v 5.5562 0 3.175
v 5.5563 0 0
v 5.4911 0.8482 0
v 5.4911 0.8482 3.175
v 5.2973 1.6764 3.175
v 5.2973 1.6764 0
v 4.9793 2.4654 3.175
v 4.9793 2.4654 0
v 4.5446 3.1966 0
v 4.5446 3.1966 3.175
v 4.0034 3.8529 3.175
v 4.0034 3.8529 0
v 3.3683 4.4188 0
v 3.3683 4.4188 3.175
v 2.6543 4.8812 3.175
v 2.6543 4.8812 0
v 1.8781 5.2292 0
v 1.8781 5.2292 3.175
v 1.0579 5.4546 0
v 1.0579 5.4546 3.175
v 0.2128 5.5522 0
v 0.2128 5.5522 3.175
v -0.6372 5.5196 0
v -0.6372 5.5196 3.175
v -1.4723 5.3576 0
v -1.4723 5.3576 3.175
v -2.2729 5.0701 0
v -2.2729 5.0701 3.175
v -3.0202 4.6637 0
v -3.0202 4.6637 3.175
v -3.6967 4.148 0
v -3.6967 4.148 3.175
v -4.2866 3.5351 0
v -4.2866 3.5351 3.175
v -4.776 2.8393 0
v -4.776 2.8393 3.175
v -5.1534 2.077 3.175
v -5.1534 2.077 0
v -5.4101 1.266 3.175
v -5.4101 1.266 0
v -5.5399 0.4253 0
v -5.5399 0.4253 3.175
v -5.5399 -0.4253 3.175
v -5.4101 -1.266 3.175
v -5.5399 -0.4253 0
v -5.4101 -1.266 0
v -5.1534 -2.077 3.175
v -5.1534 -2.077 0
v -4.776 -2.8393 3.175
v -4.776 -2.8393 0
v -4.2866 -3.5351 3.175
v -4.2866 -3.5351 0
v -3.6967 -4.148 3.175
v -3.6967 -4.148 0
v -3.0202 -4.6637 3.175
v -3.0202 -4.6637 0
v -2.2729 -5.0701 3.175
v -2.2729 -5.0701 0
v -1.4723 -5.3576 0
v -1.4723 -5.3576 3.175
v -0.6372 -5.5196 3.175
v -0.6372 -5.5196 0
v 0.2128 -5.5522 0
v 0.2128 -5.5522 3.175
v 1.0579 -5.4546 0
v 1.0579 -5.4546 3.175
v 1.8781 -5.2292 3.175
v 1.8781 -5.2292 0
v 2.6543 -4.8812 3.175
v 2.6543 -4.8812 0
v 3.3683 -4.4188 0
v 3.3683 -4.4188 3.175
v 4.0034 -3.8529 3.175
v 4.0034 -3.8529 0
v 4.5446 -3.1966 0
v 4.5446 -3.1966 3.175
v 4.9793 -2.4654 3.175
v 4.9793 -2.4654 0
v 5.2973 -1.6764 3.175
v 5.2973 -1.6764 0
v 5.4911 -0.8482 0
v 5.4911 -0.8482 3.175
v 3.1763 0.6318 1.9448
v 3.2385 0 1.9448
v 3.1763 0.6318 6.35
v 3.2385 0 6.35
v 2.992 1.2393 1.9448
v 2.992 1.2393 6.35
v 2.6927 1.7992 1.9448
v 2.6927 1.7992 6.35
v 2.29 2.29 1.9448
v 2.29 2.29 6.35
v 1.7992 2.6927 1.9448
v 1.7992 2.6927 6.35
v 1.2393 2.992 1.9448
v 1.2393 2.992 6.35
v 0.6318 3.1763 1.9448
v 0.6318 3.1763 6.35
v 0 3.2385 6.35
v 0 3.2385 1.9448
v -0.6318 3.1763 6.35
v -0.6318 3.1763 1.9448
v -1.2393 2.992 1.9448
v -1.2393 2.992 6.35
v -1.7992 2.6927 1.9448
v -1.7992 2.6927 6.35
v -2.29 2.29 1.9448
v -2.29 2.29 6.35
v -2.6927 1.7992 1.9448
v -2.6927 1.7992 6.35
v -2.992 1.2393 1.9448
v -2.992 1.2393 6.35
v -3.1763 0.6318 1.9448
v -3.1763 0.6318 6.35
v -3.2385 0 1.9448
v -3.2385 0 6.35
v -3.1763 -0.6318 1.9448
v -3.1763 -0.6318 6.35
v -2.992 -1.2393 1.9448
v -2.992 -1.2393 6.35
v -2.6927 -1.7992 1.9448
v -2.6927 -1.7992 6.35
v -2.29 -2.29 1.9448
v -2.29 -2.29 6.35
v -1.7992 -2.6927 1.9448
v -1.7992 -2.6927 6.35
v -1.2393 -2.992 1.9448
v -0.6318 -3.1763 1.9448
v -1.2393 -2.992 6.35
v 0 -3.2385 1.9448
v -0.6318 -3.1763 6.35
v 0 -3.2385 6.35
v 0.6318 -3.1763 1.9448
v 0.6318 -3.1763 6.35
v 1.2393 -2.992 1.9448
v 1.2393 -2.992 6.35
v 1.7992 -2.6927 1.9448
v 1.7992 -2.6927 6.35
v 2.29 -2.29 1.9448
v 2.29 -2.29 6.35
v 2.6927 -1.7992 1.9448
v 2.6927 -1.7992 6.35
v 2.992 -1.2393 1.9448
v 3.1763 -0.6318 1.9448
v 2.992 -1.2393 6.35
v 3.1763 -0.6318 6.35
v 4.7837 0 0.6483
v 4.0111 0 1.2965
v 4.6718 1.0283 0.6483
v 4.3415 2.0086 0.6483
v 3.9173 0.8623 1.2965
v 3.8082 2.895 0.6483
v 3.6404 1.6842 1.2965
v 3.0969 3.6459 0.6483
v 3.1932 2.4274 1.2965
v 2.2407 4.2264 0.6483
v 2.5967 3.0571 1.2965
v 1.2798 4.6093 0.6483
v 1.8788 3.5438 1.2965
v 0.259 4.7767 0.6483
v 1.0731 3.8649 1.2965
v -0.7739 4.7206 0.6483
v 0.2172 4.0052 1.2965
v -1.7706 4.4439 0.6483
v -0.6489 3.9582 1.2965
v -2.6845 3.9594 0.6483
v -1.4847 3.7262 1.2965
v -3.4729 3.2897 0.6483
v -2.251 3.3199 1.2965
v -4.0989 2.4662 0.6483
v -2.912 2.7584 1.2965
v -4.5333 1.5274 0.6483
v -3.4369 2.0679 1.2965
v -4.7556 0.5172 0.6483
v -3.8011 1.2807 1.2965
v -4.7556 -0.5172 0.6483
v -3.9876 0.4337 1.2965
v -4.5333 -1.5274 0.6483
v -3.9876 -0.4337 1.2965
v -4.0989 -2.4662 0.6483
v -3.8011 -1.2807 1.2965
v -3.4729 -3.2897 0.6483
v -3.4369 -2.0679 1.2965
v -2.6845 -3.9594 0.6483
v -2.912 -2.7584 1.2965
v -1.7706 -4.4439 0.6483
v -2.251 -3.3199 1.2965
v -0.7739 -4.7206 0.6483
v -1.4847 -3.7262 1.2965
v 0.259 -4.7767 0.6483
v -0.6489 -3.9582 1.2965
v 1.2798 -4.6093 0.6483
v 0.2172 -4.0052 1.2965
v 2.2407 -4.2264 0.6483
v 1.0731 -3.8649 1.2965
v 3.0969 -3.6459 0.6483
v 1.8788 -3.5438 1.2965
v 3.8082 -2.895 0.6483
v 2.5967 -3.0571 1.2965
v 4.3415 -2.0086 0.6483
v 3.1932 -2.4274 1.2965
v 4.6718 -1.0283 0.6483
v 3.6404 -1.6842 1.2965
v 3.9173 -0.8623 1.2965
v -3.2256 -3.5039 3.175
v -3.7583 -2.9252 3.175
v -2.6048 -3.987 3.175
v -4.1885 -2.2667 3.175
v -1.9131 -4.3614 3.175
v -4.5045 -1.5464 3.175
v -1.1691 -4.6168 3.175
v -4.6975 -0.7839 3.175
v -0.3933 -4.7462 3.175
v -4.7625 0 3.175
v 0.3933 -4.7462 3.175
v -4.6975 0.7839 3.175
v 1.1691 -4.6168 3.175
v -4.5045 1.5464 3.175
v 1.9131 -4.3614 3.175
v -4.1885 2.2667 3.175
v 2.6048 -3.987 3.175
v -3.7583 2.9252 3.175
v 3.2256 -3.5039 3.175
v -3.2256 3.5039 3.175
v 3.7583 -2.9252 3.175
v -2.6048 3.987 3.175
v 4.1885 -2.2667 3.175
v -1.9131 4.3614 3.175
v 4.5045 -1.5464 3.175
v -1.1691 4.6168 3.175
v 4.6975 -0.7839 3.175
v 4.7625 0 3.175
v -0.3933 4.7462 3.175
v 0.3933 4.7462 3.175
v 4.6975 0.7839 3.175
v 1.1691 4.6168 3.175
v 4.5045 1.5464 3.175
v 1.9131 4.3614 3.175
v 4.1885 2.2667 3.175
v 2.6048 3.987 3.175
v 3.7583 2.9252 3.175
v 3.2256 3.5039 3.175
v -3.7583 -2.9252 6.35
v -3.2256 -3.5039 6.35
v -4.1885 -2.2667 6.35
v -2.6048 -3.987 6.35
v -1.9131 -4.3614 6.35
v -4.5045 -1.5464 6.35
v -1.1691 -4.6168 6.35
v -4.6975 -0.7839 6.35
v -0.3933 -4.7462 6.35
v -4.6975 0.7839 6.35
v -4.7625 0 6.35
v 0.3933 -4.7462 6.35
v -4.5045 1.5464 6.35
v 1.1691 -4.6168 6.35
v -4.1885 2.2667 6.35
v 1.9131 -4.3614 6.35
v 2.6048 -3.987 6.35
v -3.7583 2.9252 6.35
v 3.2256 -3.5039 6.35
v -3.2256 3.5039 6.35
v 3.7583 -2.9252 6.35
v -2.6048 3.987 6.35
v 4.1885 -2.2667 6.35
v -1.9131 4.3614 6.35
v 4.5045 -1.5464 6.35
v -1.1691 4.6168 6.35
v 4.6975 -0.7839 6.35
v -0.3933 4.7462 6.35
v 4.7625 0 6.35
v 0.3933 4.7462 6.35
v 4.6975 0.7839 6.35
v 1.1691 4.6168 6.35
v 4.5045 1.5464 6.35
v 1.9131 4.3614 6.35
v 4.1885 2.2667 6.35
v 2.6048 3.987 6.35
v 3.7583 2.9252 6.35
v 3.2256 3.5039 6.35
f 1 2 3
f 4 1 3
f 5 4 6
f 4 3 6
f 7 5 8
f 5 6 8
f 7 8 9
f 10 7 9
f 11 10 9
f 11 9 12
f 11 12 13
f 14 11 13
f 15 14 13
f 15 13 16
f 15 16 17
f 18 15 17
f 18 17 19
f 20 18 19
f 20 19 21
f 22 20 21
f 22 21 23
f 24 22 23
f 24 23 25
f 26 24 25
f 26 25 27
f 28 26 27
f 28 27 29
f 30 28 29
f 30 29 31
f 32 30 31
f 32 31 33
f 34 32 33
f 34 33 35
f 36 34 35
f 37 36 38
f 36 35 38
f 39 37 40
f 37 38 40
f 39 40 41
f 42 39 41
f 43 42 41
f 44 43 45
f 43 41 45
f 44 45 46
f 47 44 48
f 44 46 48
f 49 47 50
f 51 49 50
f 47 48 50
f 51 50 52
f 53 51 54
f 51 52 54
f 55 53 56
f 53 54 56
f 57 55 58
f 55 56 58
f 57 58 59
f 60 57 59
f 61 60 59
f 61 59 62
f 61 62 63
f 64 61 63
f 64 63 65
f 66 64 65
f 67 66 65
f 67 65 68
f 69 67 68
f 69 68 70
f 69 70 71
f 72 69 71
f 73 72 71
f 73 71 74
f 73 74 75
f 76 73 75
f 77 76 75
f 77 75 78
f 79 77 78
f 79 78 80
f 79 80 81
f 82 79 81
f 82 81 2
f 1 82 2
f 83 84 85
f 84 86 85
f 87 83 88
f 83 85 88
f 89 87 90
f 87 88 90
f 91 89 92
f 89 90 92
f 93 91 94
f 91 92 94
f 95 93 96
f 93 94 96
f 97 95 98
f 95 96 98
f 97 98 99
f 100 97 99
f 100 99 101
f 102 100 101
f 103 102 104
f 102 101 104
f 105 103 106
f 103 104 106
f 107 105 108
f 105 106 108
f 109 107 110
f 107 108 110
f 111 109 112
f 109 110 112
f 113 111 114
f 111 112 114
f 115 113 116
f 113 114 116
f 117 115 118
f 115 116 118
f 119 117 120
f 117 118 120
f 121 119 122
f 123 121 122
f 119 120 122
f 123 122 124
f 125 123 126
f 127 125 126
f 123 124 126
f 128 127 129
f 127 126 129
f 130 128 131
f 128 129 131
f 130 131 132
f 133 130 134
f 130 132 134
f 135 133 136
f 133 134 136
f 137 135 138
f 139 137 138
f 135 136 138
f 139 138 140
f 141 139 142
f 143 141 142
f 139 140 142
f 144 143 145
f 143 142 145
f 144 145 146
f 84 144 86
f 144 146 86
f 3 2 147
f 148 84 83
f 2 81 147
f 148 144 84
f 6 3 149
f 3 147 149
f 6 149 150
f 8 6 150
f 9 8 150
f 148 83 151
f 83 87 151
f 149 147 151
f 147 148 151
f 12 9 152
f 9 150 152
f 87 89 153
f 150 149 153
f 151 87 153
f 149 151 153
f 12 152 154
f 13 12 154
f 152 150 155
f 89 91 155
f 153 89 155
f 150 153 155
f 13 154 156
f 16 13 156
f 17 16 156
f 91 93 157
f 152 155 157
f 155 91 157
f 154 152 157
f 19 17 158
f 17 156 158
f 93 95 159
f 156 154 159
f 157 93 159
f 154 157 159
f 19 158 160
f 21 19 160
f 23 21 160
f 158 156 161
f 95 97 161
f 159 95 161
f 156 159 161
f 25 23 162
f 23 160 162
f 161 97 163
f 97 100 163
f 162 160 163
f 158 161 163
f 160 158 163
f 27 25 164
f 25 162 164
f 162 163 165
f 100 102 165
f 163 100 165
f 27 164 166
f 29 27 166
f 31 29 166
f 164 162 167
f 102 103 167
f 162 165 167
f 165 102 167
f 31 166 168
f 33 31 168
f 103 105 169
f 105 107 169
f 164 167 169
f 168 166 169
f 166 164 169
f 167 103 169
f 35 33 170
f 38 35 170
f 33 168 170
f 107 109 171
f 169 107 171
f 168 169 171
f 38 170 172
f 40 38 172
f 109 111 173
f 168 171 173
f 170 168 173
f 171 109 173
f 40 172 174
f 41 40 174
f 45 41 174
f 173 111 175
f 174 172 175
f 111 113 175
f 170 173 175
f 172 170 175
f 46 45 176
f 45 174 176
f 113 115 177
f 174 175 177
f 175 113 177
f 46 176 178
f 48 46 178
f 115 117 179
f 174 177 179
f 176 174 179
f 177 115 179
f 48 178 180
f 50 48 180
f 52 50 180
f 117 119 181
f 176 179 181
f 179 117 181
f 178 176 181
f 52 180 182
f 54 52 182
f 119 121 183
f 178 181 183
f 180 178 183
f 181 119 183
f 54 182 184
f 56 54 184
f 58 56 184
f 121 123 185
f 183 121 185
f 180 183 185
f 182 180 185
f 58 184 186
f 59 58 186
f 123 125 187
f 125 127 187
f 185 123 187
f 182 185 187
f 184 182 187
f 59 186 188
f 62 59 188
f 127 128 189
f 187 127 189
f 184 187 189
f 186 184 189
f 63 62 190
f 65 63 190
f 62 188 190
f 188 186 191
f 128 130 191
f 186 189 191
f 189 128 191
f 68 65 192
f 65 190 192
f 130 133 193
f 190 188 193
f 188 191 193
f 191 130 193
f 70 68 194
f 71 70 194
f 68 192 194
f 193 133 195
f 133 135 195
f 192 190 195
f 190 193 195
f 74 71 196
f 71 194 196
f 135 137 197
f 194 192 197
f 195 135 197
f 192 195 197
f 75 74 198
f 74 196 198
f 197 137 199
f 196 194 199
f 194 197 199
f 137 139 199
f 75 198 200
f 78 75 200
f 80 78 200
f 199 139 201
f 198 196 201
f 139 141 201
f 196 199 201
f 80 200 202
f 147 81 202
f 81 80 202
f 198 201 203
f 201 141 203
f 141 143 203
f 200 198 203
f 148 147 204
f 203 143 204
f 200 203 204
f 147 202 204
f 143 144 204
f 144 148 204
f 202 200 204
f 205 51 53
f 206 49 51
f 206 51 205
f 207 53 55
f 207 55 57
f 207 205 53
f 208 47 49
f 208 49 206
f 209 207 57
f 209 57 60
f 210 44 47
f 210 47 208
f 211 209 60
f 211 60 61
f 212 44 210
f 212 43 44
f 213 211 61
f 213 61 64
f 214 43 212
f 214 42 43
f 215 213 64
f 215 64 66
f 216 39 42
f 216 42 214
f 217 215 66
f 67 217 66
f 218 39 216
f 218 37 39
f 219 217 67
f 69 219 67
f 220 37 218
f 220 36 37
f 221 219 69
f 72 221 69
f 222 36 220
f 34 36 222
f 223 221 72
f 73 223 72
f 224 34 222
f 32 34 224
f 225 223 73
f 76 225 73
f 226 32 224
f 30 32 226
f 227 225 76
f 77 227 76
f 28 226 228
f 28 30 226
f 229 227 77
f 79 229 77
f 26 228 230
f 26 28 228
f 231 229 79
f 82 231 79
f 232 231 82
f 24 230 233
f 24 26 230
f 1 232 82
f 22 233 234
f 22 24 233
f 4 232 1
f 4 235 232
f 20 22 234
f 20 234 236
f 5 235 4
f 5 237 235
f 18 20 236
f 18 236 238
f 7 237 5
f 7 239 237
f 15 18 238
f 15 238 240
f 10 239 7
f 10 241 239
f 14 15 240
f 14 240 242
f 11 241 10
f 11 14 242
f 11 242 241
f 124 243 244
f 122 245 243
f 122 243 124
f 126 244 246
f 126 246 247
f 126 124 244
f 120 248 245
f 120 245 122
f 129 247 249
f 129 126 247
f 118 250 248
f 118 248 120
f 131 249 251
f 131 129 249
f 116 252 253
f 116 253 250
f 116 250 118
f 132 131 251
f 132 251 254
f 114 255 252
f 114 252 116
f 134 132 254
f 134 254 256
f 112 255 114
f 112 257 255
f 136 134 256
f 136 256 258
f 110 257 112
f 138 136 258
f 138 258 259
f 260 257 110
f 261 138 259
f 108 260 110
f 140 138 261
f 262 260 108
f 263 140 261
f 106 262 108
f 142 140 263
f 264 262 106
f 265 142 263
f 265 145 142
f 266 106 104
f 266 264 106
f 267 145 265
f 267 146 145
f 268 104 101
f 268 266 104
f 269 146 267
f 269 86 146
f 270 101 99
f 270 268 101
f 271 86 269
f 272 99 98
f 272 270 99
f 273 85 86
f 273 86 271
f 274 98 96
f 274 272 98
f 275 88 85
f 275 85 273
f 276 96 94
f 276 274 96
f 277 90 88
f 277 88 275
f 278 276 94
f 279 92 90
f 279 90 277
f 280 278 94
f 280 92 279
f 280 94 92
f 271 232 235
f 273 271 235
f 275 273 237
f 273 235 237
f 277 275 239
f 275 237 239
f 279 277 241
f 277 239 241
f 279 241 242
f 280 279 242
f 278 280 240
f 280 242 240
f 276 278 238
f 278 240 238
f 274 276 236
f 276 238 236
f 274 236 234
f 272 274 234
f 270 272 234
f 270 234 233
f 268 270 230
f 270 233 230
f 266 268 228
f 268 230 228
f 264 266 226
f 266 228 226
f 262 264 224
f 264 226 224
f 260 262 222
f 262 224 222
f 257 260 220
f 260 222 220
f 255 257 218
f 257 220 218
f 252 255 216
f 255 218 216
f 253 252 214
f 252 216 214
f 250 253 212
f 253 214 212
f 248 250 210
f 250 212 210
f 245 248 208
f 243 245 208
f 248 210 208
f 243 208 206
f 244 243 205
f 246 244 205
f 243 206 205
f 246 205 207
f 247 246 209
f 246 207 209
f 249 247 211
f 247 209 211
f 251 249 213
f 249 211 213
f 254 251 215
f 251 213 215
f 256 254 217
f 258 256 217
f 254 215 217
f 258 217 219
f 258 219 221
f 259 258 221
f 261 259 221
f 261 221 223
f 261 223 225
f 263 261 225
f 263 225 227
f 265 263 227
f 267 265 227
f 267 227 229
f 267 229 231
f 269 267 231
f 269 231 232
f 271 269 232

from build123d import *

# Parameters (mm, degrees)
SKETCH1_R                                           = 5.55625
BOSS_EXTRUDE1_DEPTH                                 = 3.175
SKETCH2_R                                           = 4.7625
BOSS_EXTRUDE2_DEPTH                                 = 3.175
CSK_FOR_1_4_FLAT_HEAD_MACHINE_SCREW_100_D           = 6.477
CSK_FOR_1_4_FLAT_HEAD_MACHINE_SCREW_100_CSINK_D     = 11.1125
CSK_FOR_1_4_FLAT_HEAD_MACHINE_SCREW_100_CSINK_ANGLE = 100


with BuildPart() as part:
    # Sketch1 → Boss-Extrude1 (new body)
    with BuildSketch(Plane.XY):
        Circle(SKETCH1_R)
    extrude(amount=BOSS_EXTRUDE1_DEPTH)

    # Sketch2 → Boss-Extrude2 (add)
    with BuildSketch(Plane.XY.offset(3.175)):
        Circle(SKETCH2_R)
    extrude(amount=BOSS_EXTRUDE2_DEPTH)

    # CSK for 1/4 Flat Head Machine Screw (100)1 (through all)
    with Locations(Plane(origin=(0, 0, 0), x_dir=(-1, 0, 0), z_dir=(0, 0, -1))):
        with Locations((0, 0)):
            CounterSinkHole(CSK_FOR_1_4_FLAT_HEAD_MACHINE_SCREW_100_D / 2, CSK_FOR_1_4_FLAT_HEAD_MACHINE_SCREW_100_CSINK_D / 2, counter_sink_angle=CSK_FOR_1_4_FLAT_HEAD_MACHINE_SCREW_100_CSINK_ANGLE)


solid = part.part
